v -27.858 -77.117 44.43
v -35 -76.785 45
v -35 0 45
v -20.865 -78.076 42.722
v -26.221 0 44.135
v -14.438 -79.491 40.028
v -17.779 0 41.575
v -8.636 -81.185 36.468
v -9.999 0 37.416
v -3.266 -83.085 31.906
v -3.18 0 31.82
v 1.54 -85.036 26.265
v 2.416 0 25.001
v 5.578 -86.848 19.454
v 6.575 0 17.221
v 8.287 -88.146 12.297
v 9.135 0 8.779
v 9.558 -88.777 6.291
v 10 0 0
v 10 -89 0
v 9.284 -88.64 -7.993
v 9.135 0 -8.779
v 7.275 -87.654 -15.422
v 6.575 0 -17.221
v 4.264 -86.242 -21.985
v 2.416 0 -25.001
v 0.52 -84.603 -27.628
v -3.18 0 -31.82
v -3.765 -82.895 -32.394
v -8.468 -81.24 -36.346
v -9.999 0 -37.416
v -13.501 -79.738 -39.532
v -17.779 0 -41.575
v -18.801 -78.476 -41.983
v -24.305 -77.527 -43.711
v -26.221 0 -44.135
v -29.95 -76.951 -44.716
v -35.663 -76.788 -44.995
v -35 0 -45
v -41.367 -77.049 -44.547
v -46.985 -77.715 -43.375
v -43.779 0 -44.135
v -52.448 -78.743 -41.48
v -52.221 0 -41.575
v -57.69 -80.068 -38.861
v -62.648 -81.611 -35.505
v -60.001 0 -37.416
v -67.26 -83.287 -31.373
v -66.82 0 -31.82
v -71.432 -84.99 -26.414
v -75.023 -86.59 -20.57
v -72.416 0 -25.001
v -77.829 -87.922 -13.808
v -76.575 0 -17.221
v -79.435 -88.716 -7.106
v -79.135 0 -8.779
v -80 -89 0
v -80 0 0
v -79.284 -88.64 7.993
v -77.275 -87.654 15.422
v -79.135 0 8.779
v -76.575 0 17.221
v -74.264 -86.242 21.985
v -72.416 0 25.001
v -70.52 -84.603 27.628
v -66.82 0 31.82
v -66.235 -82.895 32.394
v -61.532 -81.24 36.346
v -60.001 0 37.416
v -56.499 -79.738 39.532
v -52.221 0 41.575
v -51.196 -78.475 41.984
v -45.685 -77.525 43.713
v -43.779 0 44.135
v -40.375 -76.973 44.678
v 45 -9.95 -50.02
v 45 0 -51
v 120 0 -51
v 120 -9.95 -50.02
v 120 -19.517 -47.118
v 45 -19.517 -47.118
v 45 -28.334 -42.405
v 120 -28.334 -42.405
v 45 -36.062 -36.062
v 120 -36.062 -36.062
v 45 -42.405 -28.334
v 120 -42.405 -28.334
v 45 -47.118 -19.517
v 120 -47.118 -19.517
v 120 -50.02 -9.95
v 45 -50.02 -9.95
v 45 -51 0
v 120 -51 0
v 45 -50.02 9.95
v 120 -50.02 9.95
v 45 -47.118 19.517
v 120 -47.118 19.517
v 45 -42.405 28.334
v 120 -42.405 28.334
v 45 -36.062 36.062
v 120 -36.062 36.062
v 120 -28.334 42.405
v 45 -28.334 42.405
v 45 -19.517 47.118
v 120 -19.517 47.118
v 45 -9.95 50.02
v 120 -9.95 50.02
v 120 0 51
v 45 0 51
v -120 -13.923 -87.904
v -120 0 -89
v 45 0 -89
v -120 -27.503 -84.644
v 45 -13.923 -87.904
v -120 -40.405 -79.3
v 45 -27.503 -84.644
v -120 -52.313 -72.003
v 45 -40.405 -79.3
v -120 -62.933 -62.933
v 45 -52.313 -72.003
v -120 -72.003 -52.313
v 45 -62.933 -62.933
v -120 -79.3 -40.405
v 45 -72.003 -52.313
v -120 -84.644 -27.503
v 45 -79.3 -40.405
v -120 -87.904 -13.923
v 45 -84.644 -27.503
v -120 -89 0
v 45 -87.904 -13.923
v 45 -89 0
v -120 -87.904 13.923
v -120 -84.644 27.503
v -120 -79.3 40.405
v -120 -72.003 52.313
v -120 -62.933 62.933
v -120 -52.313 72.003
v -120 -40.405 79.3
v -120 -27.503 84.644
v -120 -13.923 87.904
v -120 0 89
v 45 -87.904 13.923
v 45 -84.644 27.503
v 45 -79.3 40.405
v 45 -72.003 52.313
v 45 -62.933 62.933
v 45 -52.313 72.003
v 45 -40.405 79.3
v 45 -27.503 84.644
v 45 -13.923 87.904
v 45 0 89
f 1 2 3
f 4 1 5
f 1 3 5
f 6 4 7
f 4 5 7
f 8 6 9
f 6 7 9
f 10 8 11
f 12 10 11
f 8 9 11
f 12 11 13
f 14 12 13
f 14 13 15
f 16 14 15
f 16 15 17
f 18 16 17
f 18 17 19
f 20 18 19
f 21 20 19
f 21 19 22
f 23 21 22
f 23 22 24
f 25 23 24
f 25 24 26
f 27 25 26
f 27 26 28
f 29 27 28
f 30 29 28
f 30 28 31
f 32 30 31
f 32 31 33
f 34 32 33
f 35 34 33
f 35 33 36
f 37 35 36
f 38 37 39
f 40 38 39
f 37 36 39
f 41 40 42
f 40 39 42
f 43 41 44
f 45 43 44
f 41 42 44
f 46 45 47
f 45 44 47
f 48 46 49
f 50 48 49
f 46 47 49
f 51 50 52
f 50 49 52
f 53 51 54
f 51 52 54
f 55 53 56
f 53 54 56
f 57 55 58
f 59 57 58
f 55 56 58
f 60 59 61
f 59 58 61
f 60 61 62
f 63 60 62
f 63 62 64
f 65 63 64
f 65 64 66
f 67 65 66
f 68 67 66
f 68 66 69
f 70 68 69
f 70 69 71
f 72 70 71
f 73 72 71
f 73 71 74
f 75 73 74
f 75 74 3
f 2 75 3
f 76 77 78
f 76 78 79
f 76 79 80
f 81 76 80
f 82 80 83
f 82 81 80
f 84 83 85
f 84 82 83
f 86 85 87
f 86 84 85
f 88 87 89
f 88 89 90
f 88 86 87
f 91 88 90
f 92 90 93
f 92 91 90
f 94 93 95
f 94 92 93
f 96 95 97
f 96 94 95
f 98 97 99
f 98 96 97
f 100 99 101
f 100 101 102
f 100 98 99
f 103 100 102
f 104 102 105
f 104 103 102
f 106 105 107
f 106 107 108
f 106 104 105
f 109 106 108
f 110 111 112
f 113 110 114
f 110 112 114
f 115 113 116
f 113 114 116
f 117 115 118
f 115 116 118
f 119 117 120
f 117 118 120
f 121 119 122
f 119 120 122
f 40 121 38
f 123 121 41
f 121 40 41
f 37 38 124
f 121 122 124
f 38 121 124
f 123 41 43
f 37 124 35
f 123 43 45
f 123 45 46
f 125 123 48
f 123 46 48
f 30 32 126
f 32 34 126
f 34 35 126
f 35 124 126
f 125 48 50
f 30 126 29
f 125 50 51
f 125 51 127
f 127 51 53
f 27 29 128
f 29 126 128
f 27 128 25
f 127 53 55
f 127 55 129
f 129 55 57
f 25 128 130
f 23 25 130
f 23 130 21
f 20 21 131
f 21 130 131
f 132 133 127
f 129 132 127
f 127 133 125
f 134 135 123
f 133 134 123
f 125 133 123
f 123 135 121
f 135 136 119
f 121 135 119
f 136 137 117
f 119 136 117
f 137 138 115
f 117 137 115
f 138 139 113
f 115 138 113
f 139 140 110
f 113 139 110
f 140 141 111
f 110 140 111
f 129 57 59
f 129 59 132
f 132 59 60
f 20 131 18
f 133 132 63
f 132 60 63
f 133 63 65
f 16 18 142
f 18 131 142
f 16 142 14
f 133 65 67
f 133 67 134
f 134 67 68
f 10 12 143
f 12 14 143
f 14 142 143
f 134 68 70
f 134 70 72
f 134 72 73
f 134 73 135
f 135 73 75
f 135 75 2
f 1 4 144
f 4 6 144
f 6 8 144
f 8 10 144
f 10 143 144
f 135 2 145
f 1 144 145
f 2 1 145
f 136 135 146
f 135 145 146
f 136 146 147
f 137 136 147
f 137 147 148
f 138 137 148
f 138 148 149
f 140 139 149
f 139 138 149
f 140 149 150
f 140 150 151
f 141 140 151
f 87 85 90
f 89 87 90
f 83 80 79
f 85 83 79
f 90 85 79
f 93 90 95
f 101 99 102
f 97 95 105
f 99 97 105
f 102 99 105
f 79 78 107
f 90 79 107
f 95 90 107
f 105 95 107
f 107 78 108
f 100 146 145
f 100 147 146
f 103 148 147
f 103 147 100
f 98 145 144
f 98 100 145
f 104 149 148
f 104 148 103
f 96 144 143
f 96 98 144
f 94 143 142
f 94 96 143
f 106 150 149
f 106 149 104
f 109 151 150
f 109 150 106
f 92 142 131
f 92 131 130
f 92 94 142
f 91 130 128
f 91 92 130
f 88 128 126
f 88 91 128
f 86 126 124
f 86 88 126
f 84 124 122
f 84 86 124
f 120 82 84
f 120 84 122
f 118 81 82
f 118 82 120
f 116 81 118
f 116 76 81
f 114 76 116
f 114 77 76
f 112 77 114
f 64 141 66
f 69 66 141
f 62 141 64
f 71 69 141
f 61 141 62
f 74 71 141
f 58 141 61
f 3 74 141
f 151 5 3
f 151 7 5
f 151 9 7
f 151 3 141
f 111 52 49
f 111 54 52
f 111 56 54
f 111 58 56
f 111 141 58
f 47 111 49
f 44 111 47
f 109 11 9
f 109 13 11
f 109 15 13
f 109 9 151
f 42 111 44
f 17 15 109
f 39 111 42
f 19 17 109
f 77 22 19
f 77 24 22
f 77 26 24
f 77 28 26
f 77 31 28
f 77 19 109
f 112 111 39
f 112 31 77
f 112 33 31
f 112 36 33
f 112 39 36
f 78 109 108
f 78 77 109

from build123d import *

# Parameters (mm, degrees)
SCHIZZO1_W                   = 165
SCHIZZO1_H                   = 178
ESTRUSIONE_ESTRUSIONE3_DEPTH = 89
TAGLIO_ESTRUSIONE1_DEPTH     = 208.525901998
ESTRUSIONE_ESTRUSIONE5_DEPTH = 75
SCHIZZO6_R                   = 45
TAGLIO_ESTRUSIONE2_DEPTH     = 174.902271406


with BuildPart() as part:
    # Schizzo1 → Estrusione-Estrusione3 (new body)
    with BuildSketch(Plane(origin=(0, 0, 0), x_dir=(1, 0, 0), z_dir=(0, 1, 0))):
        with Locations((-37.5, 0)):
            Rectangle(SCHIZZO1_W, SCHIZZO1_H)
    extrude(amount=-ESTRUSIONE_ESTRUSIONE3_DEPTH)

    # Schizzo3 → Taglio-Estrusione1 (cut, through all)
    with BuildSketch(Plane(origin=(45, 0, 0), x_dir=(0, 0, -1), z_dir=(1, 0, 0))):
        with BuildLine():
            Line((89, -89), (89, 0))
            ThreePointArc((89, 0), (62.932503523, -62.932503528), (-7e-09, -89))
            Line((-7e-09, -89), (89, -89))
        make_face()
        with BuildLine():
            ThreePointArc((-7e-09, -89), (-62.932503528, -62.932503523), (-89, 0))
            Line((-89, 0), (-89, -89))
            Line((-89, -89), (-7e-09, -89))
        make_face()
    extrude(amount=-TAGLIO_ESTRUSIONE1_DEPTH, mode=Mode.SUBTRACT)

    # Schizzo4 → Estrusione-Estrusione5 (add)
    with BuildSketch(Plane(origin=(45, 0, 0), x_dir=(0, 0, -1), z_dir=(1, 0, 0))):
        with BuildLine():
            Line((-51, 0), (51, 0))
            ThreePointArc((51, 0), (0, -51), (-51, 0))
        make_face()
    extrude(amount=ESTRUSIONE_ESTRUSIONE5_DEPTH)

    # Schizzo6 → Taglio-Estrusione2 (cut, through all)
    with BuildSketch(Plane(origin=(0, 0, 0), x_dir=(1, 0, 0), z_dir=(0, 1, 0))):
        with Locations(Location((-35, 0, 0), (0, 0, 270))):
            Circle(SCHIZZO6_R)
    extrude(amount=-TAGLIO_ESTRUSIONE2_DEPTH, mode=Mode.SUBTRACT)


solid = part.part
